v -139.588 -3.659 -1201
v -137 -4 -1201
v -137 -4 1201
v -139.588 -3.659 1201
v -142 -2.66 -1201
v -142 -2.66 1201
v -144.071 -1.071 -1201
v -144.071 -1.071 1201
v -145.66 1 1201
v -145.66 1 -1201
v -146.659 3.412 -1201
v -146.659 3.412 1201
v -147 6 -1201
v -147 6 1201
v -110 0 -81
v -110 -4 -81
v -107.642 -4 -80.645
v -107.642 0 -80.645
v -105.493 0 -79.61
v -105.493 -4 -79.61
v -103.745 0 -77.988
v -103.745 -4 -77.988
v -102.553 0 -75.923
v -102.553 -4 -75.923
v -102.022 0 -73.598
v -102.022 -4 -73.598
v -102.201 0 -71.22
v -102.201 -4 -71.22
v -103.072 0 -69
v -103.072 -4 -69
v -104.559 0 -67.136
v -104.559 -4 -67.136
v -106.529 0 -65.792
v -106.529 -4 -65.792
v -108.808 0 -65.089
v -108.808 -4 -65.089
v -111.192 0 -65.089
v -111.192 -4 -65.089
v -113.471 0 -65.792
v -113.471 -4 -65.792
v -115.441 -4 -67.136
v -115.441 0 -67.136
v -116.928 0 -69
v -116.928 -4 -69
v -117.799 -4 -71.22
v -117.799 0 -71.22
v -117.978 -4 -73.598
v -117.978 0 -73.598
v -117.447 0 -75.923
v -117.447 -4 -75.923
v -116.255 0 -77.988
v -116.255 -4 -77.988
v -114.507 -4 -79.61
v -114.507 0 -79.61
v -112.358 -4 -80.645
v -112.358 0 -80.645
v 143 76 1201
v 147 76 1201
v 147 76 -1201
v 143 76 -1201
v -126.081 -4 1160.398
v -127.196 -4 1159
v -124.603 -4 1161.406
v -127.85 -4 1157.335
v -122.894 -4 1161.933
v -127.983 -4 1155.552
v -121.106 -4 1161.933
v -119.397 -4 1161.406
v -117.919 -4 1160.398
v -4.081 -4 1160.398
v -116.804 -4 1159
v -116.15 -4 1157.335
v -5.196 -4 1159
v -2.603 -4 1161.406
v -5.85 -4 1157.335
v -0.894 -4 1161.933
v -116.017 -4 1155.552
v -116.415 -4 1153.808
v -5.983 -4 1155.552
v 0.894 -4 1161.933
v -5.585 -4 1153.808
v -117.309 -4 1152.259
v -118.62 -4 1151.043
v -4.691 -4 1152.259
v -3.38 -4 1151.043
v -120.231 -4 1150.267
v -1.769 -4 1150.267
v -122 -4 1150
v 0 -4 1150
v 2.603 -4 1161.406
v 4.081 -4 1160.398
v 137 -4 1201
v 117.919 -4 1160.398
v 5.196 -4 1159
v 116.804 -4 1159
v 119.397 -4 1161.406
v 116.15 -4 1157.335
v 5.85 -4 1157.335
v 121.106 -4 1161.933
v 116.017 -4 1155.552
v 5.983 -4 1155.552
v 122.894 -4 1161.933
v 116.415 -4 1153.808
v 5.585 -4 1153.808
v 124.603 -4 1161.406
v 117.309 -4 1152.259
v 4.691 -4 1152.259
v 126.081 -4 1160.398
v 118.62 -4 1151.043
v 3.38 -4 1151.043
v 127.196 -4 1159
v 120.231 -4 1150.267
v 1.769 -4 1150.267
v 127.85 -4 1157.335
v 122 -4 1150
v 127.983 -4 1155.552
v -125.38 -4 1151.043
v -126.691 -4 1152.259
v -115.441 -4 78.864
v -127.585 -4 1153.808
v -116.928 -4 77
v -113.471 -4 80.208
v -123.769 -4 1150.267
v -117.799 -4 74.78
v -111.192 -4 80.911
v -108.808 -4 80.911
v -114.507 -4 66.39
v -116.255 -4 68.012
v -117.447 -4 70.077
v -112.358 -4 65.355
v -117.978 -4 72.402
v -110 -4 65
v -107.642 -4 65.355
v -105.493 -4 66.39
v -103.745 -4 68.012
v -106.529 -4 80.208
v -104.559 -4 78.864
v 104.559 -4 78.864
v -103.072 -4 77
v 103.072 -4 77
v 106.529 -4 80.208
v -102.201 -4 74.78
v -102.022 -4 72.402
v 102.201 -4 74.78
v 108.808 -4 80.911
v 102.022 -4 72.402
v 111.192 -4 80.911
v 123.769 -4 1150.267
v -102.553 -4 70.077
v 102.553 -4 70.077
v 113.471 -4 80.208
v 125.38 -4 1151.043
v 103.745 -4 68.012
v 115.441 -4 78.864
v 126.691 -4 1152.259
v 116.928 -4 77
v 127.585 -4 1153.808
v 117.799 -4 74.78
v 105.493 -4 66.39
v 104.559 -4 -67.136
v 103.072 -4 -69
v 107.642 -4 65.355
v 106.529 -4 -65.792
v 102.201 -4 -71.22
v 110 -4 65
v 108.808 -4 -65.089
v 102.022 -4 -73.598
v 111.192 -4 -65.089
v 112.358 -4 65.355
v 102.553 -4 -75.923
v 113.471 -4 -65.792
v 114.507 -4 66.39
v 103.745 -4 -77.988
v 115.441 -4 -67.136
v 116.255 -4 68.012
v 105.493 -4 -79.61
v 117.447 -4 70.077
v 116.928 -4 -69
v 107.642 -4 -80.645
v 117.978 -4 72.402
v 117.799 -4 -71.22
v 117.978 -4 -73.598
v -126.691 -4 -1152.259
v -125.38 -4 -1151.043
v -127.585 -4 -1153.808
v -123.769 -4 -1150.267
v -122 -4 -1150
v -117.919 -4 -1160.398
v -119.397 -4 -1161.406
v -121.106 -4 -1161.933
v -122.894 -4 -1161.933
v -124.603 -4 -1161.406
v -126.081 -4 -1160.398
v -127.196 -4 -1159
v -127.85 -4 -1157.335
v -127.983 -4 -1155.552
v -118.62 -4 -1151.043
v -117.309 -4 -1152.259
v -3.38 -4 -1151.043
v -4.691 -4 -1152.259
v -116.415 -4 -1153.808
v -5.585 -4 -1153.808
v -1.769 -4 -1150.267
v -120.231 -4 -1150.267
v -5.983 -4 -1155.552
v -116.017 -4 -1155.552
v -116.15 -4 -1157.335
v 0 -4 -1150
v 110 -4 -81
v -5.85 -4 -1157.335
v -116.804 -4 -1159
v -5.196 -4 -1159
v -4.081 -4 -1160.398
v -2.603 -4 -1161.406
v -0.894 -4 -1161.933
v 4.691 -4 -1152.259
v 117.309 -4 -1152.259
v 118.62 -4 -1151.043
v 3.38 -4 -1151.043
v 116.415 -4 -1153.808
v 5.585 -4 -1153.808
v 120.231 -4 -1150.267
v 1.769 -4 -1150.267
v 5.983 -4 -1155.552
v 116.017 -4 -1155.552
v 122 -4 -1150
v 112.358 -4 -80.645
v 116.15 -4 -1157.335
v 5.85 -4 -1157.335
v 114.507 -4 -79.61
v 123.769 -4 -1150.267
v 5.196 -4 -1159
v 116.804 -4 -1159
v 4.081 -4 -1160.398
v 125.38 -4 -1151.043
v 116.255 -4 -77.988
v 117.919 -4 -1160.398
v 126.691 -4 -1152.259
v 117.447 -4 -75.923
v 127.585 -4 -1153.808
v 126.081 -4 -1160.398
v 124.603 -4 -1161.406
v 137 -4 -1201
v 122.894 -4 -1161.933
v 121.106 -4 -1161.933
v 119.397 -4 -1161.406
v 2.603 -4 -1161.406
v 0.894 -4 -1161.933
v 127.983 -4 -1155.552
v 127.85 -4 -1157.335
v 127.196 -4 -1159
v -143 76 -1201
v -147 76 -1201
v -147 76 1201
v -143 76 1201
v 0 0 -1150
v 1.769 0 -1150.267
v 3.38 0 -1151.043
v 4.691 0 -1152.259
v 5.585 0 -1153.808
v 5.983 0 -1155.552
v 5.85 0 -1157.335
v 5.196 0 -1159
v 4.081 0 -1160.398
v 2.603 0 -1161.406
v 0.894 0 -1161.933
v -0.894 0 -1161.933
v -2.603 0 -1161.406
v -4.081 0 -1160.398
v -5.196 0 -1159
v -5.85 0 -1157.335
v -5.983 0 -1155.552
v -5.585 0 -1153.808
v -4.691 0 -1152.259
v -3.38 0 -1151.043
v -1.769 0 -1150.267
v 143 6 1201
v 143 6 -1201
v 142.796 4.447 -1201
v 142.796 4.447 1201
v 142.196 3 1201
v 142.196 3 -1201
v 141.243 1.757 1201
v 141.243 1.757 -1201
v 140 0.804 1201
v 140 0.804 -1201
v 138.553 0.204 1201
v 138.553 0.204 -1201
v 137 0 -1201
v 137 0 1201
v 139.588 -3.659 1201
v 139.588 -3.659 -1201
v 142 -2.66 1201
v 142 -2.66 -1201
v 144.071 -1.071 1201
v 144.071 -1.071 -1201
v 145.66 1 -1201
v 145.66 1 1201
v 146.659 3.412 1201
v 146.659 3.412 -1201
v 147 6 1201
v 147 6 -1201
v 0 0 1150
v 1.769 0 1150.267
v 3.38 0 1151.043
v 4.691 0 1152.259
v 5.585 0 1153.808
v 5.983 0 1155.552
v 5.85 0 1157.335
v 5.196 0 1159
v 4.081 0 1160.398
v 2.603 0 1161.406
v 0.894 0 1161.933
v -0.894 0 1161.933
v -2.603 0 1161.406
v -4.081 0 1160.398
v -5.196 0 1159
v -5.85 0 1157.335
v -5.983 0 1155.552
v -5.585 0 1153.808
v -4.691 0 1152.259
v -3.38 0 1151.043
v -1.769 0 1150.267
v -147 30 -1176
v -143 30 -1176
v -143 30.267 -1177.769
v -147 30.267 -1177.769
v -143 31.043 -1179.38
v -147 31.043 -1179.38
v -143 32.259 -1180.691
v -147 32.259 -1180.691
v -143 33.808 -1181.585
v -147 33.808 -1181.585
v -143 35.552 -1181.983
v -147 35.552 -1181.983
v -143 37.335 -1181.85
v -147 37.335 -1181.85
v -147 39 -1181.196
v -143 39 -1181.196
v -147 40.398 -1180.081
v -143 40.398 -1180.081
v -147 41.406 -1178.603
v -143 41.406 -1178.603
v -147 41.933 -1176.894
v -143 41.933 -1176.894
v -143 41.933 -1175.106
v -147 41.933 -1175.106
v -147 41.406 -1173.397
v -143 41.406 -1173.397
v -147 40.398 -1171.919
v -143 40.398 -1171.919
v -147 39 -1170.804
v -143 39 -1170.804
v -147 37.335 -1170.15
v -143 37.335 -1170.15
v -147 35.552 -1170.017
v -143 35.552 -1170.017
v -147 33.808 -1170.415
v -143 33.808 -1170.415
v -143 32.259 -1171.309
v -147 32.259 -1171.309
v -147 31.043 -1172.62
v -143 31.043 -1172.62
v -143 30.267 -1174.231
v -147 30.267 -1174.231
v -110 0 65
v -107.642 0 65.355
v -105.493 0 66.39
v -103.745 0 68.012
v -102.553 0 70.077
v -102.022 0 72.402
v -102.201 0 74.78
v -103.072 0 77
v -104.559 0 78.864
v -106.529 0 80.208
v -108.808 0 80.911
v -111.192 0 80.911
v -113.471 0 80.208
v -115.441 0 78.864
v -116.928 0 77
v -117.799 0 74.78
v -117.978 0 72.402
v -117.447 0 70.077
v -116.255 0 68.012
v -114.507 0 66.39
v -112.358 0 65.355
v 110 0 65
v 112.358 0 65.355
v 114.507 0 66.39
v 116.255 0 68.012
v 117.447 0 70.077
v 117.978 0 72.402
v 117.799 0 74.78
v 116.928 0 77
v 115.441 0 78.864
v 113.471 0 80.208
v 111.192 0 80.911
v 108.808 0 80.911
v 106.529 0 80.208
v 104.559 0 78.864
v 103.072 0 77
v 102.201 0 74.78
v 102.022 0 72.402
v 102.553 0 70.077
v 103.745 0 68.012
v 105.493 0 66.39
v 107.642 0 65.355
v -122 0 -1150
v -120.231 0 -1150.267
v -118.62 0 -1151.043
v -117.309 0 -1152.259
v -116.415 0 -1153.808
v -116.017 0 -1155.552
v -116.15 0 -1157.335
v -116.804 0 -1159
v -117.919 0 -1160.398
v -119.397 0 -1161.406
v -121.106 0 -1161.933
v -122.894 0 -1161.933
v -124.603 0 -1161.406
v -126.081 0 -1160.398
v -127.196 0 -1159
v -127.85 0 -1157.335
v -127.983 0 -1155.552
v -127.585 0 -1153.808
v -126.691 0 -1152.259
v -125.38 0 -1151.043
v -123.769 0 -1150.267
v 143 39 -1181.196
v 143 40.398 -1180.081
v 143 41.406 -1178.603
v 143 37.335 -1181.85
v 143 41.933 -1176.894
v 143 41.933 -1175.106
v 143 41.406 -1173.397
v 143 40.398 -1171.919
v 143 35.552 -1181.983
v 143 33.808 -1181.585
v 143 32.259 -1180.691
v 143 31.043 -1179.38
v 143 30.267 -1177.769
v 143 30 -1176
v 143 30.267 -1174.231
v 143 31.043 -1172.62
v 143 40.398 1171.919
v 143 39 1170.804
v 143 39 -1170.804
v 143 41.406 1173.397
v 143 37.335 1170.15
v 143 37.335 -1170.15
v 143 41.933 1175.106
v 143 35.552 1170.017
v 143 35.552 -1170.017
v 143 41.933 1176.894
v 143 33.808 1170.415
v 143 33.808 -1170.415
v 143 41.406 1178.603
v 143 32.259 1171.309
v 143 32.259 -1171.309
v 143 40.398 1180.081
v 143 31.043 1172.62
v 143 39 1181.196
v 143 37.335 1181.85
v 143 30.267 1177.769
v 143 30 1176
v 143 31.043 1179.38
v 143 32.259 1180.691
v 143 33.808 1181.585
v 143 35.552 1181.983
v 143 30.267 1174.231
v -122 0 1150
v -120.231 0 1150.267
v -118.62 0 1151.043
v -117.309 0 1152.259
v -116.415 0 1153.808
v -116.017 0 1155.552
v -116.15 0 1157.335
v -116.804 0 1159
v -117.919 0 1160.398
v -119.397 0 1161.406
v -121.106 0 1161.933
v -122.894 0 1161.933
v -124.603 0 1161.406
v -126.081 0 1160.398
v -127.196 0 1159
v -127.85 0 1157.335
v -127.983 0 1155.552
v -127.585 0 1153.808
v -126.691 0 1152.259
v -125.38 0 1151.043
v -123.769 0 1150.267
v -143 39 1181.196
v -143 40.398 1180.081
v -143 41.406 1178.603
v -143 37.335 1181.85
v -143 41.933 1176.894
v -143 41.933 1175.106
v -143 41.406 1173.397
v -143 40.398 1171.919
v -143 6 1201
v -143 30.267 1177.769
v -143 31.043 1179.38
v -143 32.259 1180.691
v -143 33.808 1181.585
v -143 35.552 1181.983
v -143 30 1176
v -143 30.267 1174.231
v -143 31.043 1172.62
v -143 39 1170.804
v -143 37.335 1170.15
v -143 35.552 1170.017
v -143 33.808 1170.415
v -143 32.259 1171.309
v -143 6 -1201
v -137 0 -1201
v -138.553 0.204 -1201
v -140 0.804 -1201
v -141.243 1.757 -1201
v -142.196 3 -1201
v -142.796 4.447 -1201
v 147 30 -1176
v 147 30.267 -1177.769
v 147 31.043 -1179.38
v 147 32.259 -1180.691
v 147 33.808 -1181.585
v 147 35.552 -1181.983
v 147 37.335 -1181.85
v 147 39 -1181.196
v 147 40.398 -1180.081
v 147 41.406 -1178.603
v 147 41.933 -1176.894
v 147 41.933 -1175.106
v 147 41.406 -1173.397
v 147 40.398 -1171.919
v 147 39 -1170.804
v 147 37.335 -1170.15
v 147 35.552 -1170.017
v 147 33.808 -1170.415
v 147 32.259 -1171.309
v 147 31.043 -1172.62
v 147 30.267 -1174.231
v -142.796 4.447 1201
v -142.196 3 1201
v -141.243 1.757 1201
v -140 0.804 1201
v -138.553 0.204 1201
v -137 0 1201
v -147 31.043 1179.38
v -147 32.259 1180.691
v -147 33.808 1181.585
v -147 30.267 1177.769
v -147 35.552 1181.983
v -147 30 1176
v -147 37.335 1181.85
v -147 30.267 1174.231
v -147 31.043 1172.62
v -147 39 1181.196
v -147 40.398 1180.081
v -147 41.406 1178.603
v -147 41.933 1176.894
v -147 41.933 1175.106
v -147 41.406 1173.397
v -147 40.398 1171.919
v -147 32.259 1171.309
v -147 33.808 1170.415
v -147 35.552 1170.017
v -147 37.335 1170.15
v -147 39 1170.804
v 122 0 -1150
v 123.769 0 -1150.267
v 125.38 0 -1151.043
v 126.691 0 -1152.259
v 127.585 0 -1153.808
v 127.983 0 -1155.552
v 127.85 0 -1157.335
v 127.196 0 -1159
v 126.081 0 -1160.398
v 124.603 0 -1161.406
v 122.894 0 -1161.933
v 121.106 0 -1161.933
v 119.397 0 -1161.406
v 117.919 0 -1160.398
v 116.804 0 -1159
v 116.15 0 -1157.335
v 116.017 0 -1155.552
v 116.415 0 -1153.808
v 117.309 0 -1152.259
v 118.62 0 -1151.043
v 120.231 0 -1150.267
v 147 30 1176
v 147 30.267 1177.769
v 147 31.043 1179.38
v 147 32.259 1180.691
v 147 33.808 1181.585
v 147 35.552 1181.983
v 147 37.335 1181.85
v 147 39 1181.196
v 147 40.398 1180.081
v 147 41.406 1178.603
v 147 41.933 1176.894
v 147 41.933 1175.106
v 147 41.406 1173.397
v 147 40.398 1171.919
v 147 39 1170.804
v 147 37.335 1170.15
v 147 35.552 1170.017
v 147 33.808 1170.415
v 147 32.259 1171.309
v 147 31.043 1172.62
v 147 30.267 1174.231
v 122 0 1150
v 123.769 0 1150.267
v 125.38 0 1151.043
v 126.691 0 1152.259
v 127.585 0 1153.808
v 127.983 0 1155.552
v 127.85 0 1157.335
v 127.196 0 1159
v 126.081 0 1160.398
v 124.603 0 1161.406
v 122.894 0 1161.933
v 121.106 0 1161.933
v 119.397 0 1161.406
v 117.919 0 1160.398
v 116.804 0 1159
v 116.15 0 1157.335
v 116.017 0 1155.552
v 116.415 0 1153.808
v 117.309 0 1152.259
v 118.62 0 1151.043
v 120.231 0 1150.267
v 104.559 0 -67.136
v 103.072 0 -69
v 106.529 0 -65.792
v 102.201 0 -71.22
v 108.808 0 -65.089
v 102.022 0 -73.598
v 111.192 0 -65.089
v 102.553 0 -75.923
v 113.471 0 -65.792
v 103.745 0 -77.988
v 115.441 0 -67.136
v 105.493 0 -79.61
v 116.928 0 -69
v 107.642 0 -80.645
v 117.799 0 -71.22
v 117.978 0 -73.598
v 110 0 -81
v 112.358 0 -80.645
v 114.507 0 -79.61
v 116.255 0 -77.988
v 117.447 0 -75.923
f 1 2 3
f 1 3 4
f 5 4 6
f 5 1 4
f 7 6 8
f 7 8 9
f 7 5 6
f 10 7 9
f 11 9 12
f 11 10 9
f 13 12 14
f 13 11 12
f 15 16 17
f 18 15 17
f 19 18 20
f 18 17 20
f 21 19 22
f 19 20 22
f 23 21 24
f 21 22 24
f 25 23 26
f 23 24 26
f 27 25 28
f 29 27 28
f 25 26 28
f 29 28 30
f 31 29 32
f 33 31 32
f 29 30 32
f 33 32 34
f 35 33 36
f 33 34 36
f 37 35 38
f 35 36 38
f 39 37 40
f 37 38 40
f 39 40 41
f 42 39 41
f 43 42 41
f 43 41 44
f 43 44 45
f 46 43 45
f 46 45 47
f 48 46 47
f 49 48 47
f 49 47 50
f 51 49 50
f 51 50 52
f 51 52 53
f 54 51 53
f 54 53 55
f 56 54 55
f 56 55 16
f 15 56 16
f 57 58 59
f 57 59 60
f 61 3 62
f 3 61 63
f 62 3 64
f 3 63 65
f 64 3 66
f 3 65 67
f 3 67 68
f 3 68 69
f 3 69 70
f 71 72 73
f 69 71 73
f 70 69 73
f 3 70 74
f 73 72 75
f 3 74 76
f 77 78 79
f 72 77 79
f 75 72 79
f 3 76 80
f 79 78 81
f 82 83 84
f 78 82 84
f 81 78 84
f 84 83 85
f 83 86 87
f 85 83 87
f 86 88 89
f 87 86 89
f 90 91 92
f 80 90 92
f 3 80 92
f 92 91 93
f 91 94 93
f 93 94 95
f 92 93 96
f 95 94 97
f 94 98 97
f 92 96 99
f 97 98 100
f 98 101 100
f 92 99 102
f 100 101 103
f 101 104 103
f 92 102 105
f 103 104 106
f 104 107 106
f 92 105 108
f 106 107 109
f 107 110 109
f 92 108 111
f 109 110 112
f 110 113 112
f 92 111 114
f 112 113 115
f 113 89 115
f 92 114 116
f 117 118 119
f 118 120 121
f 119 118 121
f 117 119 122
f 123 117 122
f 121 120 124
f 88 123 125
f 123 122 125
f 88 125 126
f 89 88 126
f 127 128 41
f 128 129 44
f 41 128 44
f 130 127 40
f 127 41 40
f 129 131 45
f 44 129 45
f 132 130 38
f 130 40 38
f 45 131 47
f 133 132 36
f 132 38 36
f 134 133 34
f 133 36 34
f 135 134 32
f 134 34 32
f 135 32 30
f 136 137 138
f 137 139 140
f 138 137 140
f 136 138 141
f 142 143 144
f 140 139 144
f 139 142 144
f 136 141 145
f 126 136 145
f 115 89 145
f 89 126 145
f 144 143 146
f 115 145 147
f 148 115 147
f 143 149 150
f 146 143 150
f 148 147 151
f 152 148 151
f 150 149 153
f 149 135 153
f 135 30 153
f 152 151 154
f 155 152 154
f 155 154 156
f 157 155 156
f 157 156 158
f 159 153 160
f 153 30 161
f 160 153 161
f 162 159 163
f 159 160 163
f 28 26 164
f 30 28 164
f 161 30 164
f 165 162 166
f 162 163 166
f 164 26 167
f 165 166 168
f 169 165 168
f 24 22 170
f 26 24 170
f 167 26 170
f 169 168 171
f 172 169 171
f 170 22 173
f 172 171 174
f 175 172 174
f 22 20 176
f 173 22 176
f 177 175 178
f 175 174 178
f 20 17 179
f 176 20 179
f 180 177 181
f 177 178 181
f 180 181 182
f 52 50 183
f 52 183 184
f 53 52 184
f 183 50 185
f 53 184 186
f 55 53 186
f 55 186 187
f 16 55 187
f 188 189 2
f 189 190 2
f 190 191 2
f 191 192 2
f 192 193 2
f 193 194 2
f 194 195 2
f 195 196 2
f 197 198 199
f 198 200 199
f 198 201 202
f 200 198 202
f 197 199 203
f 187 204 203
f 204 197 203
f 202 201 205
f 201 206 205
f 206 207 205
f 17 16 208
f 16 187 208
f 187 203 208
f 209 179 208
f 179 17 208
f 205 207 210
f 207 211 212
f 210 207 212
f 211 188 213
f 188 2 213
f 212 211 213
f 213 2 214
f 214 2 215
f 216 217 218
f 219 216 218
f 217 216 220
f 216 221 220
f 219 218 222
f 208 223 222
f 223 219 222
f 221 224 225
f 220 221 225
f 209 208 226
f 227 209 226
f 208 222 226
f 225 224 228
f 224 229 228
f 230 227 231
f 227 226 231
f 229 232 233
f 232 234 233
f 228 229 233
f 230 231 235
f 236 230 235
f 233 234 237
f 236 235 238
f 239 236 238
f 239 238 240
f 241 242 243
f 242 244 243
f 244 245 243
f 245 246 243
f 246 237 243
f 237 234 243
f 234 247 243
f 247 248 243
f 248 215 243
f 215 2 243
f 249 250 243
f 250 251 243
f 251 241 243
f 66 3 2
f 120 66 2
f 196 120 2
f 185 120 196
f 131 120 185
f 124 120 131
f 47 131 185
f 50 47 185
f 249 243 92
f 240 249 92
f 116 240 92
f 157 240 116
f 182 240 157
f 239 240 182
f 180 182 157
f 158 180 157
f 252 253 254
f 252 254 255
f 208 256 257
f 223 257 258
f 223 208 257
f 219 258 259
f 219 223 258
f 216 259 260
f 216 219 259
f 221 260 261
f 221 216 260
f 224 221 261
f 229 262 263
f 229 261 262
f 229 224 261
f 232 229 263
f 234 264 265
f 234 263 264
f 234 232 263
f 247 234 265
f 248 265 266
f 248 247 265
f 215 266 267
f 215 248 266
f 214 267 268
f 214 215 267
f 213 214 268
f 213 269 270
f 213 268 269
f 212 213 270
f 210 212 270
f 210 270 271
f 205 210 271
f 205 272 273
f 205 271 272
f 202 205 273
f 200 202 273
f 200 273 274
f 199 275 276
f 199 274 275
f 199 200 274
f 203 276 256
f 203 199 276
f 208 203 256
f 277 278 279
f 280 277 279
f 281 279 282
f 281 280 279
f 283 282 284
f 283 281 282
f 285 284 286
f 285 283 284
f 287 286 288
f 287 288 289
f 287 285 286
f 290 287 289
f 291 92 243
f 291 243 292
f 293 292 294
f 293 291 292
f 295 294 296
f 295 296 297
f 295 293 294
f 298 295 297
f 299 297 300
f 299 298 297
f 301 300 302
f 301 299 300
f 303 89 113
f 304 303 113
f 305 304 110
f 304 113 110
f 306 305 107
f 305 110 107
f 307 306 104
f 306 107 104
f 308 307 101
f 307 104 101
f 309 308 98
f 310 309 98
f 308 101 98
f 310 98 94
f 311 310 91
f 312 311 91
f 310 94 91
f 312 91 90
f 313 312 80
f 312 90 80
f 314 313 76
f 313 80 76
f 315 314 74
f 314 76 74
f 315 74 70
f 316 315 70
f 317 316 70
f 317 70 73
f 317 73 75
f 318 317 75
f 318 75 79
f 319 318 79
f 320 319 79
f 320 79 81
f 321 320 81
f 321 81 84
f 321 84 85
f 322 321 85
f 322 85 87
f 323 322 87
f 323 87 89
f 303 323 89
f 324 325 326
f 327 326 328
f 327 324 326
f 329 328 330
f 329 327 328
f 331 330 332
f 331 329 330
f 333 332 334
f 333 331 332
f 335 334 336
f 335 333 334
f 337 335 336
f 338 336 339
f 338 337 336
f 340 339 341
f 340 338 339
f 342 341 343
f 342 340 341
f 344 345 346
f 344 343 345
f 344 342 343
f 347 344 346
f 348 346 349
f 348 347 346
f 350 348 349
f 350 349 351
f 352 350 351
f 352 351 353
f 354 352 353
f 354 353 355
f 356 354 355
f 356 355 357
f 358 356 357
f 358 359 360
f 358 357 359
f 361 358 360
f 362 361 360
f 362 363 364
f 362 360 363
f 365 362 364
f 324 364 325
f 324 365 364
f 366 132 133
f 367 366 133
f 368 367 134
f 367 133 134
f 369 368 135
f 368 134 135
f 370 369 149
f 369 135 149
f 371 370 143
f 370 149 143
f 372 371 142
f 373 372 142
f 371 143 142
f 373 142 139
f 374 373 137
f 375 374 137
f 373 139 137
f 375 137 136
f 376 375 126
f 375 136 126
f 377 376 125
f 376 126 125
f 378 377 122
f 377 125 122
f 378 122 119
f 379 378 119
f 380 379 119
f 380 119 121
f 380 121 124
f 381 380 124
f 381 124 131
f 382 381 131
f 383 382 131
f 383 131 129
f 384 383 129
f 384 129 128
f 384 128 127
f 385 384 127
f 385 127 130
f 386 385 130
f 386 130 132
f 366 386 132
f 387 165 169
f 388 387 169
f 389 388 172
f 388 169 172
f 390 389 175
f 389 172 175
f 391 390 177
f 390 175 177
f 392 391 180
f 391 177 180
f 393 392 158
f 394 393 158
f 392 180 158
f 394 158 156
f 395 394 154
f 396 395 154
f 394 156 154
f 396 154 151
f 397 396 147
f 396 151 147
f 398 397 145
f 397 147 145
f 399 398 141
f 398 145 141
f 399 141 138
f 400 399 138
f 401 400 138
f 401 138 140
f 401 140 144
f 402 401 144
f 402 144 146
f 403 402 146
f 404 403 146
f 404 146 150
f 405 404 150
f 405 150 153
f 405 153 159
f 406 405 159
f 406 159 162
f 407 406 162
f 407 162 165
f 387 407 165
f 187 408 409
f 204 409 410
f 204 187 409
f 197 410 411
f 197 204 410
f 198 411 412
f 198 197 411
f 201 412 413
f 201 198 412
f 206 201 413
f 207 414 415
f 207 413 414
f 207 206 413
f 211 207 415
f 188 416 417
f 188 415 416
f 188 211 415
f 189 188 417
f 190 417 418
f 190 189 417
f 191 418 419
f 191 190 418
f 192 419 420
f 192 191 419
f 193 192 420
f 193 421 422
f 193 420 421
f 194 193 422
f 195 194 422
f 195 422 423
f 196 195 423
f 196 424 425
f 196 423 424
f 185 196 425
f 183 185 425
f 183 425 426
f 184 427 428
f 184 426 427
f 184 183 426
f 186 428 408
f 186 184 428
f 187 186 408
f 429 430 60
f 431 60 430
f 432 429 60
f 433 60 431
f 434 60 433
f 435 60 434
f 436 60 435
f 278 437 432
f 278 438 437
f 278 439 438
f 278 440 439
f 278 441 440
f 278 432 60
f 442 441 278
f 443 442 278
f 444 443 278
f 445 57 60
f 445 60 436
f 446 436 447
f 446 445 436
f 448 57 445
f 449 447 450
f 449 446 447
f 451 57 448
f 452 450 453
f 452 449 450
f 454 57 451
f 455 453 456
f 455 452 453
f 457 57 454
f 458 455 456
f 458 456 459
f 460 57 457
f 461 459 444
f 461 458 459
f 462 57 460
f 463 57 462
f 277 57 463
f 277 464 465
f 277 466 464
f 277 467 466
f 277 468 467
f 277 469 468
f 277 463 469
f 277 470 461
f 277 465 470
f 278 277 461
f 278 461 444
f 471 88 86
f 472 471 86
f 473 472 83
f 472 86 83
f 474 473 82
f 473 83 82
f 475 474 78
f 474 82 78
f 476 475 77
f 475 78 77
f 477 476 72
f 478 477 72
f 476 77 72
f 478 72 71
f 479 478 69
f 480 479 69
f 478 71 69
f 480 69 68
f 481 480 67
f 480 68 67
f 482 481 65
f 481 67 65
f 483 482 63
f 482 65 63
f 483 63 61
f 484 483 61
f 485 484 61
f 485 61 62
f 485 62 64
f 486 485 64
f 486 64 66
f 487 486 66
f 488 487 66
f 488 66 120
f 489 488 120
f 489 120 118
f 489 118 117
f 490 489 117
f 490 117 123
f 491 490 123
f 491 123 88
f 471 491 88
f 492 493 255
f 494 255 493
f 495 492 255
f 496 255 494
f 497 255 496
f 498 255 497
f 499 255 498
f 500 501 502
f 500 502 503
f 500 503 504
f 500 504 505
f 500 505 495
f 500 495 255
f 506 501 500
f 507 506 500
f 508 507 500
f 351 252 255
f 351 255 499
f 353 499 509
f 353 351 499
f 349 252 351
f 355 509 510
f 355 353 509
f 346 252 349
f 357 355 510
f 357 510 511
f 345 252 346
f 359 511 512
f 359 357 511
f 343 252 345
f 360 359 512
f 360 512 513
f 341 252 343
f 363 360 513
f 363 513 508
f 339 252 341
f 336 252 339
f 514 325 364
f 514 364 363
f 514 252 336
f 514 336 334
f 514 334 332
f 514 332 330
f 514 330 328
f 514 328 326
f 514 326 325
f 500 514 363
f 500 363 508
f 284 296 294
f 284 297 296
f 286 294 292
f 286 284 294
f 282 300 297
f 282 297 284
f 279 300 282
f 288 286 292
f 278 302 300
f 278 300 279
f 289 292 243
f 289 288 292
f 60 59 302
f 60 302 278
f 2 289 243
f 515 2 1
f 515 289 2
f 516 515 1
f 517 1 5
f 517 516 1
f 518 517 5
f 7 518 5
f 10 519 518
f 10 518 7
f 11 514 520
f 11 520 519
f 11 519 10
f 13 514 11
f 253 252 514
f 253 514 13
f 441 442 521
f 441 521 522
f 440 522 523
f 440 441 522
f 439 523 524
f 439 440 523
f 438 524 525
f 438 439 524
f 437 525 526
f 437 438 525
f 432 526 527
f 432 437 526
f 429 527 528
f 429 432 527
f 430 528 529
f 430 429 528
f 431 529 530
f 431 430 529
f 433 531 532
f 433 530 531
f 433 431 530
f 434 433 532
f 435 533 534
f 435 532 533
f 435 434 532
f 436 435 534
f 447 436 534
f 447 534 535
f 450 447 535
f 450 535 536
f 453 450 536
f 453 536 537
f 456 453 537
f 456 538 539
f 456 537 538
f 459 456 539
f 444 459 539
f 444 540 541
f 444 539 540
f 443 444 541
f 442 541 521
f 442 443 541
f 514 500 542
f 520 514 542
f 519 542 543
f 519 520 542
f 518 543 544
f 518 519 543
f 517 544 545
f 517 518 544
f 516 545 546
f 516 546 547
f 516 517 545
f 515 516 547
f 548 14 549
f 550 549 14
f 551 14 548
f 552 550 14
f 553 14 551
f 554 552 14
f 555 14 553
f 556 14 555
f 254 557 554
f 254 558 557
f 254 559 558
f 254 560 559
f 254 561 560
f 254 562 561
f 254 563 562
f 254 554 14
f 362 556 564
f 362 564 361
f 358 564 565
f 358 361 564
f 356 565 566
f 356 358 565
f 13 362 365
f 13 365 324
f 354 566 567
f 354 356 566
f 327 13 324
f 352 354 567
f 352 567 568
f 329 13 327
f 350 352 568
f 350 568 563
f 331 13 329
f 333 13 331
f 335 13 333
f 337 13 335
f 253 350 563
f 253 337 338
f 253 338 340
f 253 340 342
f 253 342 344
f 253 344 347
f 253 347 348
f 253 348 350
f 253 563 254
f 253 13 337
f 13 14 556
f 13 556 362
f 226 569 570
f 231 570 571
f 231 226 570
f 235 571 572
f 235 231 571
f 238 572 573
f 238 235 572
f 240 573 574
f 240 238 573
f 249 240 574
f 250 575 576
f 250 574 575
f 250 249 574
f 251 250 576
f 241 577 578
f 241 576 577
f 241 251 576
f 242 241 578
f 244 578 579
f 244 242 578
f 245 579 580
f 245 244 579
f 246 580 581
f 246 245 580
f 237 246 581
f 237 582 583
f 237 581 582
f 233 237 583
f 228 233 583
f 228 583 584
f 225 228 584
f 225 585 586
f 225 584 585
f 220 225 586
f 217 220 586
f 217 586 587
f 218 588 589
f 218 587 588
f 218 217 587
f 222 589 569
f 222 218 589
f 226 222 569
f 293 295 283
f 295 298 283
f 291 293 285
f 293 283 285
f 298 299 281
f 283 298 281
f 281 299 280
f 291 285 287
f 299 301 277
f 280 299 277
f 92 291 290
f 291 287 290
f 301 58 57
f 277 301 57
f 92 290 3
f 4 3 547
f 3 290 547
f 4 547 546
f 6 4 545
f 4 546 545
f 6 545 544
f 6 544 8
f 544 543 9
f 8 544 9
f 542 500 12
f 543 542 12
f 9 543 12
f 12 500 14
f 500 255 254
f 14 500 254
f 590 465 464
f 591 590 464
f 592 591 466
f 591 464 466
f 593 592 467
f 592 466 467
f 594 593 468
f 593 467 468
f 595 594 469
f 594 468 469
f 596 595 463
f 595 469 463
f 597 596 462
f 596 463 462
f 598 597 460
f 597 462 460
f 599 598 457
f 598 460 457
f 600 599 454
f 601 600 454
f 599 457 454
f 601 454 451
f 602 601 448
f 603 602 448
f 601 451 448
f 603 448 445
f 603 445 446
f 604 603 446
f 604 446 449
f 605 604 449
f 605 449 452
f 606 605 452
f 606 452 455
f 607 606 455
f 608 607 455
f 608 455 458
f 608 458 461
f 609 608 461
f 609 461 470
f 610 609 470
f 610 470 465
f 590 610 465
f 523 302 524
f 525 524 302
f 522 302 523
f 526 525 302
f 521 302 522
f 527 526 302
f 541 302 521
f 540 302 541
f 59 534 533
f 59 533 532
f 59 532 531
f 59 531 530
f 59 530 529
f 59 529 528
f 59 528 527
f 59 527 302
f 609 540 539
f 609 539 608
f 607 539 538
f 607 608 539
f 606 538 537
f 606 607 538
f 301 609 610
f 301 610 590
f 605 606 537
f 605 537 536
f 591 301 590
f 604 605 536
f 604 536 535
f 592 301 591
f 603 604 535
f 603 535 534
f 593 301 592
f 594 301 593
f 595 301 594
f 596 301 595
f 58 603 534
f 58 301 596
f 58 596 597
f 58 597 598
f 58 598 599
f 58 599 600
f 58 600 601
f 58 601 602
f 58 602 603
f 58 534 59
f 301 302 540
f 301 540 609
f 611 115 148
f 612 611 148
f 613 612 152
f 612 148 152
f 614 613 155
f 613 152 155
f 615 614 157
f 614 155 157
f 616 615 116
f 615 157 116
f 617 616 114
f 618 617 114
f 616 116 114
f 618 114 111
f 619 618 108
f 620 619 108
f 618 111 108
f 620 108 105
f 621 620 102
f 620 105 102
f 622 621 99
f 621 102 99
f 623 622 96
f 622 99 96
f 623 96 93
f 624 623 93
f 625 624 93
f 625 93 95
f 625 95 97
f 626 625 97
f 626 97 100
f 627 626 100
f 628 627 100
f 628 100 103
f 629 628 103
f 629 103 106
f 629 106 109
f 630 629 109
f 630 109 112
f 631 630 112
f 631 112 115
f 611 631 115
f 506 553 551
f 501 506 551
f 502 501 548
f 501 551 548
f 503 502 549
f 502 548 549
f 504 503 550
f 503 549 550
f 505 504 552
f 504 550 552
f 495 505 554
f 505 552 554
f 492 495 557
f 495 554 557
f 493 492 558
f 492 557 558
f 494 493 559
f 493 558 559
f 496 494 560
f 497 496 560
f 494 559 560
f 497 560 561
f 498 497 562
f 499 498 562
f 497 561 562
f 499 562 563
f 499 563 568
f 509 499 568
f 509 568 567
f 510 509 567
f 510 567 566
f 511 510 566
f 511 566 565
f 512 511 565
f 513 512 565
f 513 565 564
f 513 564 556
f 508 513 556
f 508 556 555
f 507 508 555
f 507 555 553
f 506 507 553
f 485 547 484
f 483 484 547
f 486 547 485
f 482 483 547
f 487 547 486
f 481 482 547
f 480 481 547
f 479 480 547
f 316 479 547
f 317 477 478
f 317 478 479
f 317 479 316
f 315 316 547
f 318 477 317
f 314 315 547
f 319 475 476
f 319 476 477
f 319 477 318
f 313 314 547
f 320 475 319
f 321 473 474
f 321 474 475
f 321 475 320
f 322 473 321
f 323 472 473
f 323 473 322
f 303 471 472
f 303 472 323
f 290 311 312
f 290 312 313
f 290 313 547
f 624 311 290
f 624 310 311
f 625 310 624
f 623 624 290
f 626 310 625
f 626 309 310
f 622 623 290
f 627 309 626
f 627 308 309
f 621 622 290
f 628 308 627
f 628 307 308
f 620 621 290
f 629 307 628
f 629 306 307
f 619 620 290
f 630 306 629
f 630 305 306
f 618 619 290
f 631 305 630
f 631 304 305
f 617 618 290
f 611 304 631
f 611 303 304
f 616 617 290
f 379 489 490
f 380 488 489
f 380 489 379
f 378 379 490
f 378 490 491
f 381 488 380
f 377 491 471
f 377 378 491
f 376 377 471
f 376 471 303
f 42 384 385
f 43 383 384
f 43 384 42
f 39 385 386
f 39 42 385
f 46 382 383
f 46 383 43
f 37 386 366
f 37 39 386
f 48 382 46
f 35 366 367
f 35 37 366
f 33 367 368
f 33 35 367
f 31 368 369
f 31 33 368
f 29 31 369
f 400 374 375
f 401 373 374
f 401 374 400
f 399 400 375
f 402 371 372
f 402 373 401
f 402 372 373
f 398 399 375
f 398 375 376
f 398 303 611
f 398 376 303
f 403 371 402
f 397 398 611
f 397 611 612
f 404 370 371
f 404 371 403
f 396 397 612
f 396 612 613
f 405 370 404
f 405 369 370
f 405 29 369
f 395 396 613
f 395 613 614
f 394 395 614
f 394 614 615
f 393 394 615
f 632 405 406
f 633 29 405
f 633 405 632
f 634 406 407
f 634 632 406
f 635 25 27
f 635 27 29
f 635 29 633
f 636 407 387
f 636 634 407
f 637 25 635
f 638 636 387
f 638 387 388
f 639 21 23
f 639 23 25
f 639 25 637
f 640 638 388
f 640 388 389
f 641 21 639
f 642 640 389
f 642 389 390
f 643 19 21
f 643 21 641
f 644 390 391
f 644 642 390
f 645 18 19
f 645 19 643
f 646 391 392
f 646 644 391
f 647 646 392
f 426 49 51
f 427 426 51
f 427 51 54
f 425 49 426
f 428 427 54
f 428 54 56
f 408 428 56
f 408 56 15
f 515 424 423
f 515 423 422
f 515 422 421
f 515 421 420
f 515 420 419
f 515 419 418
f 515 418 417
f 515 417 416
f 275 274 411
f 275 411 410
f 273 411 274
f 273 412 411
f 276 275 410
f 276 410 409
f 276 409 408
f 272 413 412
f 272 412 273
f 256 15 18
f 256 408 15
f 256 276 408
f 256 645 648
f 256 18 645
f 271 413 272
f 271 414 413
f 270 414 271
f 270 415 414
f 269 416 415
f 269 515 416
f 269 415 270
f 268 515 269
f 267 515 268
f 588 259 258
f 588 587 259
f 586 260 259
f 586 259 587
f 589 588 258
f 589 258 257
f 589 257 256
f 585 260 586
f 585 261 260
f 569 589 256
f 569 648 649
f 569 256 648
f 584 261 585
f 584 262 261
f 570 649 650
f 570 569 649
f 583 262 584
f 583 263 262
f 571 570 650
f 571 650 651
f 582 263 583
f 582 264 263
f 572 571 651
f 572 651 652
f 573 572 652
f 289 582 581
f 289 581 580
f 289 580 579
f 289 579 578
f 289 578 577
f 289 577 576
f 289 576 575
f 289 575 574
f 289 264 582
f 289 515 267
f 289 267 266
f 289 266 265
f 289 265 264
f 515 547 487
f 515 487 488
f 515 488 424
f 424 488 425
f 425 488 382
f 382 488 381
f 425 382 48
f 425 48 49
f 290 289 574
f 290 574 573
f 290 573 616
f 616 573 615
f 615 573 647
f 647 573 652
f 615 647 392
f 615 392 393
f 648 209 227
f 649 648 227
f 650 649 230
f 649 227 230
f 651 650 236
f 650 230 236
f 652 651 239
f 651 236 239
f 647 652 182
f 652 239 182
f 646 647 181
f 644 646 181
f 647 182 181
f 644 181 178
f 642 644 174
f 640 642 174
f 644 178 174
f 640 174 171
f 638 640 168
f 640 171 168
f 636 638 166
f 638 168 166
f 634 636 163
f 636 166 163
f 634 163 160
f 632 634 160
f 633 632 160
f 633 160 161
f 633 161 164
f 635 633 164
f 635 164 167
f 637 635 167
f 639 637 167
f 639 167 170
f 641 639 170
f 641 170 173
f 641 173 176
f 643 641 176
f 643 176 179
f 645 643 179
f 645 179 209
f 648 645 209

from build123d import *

# Parameters (mm, degrees)
SKETCH1_W                      = 294
SKETCH1_H                      = 2402
BASE_FLANGE1_DEPTH             = 4
EDGE_FLANGE1_STRIP_W           = 28
EDGE_FLANGE1_STRIP_H           = 4
EDGE_FLANGE1_STRIP_CUT_DEPTH   = 2402
EDGE_FLANGE1_STRIP_2_W         = 28
EDGE_FLANGE1_STRIP_2_H         = 4
EDGE_FLANGE1_STRIP_CUT_2_DEPTH = 2402
EDGE_FLANGE1_DEPTH             = 2402
EDGE_FLANGE1_BEND_DEPTH        = 2402
SKETCH20_R                     = 8
CUT_EXTRUDE3_DEPTH             = 10
LPATTERN1_COUNT                = 2
LPATTERN1_PITCH                = 220
LPATTERN1_COUNT_DIR2           = 2
LPATTERN1_PITCH_DIR2           = 146
SKETCH21_R                     = 6
CUT_EXTRUDE4_DEPTH             = 10
SKETCH22_R                     = 6
CUT_EXTRUDE5_DEPTH             = 10
SKETCH23_R                     = 6
CUT_EXTRUDE6_DEPTH             = 1239.794979002


# Sheet-metal steps are written as plain solids
with BuildPart() as part:
    # Sketch1 → Base-Flange1 (new body)
    with BuildSketch(Plane(origin=(0, 0, 0), x_dir=(1, 0, 0), z_dir=(0, 1, 0))):
        Rectangle(SKETCH1_W, SKETCH1_H)
    extrude(amount=-BASE_FLANGE1_DEPTH)

    # Edge-Flange1 strip (across the edge) → Edge-Flange1 strip cut (cut)
    with BuildSketch(Plane(origin=(147, 0, 1201), x_dir=(-1, 0, 0), z_dir=(0, 0, -1))):
        with Locations((-4, -2)):
            Rectangle(EDGE_FLANGE1_STRIP_W, EDGE_FLANGE1_STRIP_H)
    extrude(amount=EDGE_FLANGE1_STRIP_CUT_DEPTH, mode=Mode.SUBTRACT)

    # Edge-Flange1 strip 2 (across the edge) → Edge-Flange1 strip cut 2 (cut)
    with BuildSketch(Plane(origin=(-147, 0, -1201), x_dir=(1, 0, 0), z_dir=(0, 0, 1))):
        with Locations((-4, -2)):
            Rectangle(EDGE_FLANGE1_STRIP_2_W, EDGE_FLANGE1_STRIP_2_H)
    extrude(amount=EDGE_FLANGE1_STRIP_CUT_2_DEPTH, mode=Mode.SUBTRACT)

    # Edge-Flange1 section (across the edge) → Edge-Flange1 (add)
    with BuildSketch(Plane(origin=(147, 0, 1201), x_dir=(-1, 0, 0), z_dir=(0, 0, -1))):
        with BuildLine():
            Line((0, 6), (0, 76))
            Line((0, 76), (4, 76))
            Line((4, 76), (4, 6))
            ThreePointArc((4, 6), (5.757359313, 1.757359313), (10, 0))
            Line((10, 0), (10, -4))
            ThreePointArc((10, -4), (2.928932188, -1.071067812), (0, 6))
        make_face()
    extrude(amount=EDGE_FLANGE1_DEPTH)

    # Edge-Flange1 section 2 (across the edge) → Edge-Flange1 bend (add)
    with BuildSketch(Plane(origin=(-147, 0, -1201), x_dir=(1, 0, 0), z_dir=(0, 0, 1))):
        with BuildLine():
            Line((0, 6), (0, 76))
            Line((0, 76), (4, 76))
            Line((4, 76), (4, 6))
            ThreePointArc((4, 6), (5.757359313, 1.757359313), (10, 0))
            Line((10, 0), (10, -4))
            ThreePointArc((10, -4), (2.928932188, -1.071067812), (0, 6))
        make_face()
    extrude(amount=EDGE_FLANGE1_BEND_DEPTH)

    # Sketch20 → Cut-Extrude3 (cut)
    with BuildSketch(Plane.XZ.offset(4)):
        with Locations(Location((-110, 73, 0), (0, 0, 270))):
            Circle(SKETCH20_R)
    cut_extrude3 = extrude(amount=-CUT_EXTRUDE3_DEPTH, mode=Mode.SUBTRACT)

    # LPattern1: Cut-Extrude3 2 × 2
    with Locations(*[(i * LPATTERN1_PITCH, 0, -j * LPATTERN1_PITCH_DIR2) for i in range(LPATTERN1_COUNT) for j in range(LPATTERN1_COUNT_DIR2) if (i, j) != (0, 0)]):
        add(cut_extrude3, mode=Mode.SUBTRACT)

    # Sketch21 → Cut-Extrude4 (cut)
    with BuildSketch(Plane.XZ.offset(4)):
        with Locations(Location((-122, 1156, 0), (0, 0, 270))):
            Circle(SKETCH21_R)
        with Locations(Location((122, 1156, 0), (0, 0, 270))):
            Circle(SKETCH21_R)
    cut_extrude4 = extrude(amount=-CUT_EXTRUDE4_DEPTH, mode=Mode.SUBTRACT)

    # Sketch22 → Cut-Extrude5 (cut)
    with BuildSketch(Plane.XZ.offset(4)):
        with Locations(Location((0, 1156, 0), (0, 0, 270))):
            Circle(SKETCH22_R)
    cut_extrude5 = extrude(amount=-CUT_EXTRUDE5_DEPTH, mode=Mode.SUBTRACT)

    # Sketch23 → Cut-Extrude6 (cut, through all)
    with BuildSketch(Plane.ZY.offset(147)):
        with Locations(Location((1176, 36, 0), (0, 0, 270))):
            Circle(SKETCH23_R)
    cut_extrude6 = extrude(amount=-CUT_EXTRUDE6_DEPTH, mode=Mode.SUBTRACT)

    # Mirror1: Cut-Extrude4, Cut-Extrude5, Cut-Extrude6 across plane
    add(cut_extrude4.mirror(Plane.XY), mode=Mode.SUBTRACT)
    add(cut_extrude5.mirror(Plane.XY), mode=Mode.SUBTRACT)
    add(cut_extrude6.mirror(Plane.XY), mode=Mode.SUBTRACT)


solid = part.part
